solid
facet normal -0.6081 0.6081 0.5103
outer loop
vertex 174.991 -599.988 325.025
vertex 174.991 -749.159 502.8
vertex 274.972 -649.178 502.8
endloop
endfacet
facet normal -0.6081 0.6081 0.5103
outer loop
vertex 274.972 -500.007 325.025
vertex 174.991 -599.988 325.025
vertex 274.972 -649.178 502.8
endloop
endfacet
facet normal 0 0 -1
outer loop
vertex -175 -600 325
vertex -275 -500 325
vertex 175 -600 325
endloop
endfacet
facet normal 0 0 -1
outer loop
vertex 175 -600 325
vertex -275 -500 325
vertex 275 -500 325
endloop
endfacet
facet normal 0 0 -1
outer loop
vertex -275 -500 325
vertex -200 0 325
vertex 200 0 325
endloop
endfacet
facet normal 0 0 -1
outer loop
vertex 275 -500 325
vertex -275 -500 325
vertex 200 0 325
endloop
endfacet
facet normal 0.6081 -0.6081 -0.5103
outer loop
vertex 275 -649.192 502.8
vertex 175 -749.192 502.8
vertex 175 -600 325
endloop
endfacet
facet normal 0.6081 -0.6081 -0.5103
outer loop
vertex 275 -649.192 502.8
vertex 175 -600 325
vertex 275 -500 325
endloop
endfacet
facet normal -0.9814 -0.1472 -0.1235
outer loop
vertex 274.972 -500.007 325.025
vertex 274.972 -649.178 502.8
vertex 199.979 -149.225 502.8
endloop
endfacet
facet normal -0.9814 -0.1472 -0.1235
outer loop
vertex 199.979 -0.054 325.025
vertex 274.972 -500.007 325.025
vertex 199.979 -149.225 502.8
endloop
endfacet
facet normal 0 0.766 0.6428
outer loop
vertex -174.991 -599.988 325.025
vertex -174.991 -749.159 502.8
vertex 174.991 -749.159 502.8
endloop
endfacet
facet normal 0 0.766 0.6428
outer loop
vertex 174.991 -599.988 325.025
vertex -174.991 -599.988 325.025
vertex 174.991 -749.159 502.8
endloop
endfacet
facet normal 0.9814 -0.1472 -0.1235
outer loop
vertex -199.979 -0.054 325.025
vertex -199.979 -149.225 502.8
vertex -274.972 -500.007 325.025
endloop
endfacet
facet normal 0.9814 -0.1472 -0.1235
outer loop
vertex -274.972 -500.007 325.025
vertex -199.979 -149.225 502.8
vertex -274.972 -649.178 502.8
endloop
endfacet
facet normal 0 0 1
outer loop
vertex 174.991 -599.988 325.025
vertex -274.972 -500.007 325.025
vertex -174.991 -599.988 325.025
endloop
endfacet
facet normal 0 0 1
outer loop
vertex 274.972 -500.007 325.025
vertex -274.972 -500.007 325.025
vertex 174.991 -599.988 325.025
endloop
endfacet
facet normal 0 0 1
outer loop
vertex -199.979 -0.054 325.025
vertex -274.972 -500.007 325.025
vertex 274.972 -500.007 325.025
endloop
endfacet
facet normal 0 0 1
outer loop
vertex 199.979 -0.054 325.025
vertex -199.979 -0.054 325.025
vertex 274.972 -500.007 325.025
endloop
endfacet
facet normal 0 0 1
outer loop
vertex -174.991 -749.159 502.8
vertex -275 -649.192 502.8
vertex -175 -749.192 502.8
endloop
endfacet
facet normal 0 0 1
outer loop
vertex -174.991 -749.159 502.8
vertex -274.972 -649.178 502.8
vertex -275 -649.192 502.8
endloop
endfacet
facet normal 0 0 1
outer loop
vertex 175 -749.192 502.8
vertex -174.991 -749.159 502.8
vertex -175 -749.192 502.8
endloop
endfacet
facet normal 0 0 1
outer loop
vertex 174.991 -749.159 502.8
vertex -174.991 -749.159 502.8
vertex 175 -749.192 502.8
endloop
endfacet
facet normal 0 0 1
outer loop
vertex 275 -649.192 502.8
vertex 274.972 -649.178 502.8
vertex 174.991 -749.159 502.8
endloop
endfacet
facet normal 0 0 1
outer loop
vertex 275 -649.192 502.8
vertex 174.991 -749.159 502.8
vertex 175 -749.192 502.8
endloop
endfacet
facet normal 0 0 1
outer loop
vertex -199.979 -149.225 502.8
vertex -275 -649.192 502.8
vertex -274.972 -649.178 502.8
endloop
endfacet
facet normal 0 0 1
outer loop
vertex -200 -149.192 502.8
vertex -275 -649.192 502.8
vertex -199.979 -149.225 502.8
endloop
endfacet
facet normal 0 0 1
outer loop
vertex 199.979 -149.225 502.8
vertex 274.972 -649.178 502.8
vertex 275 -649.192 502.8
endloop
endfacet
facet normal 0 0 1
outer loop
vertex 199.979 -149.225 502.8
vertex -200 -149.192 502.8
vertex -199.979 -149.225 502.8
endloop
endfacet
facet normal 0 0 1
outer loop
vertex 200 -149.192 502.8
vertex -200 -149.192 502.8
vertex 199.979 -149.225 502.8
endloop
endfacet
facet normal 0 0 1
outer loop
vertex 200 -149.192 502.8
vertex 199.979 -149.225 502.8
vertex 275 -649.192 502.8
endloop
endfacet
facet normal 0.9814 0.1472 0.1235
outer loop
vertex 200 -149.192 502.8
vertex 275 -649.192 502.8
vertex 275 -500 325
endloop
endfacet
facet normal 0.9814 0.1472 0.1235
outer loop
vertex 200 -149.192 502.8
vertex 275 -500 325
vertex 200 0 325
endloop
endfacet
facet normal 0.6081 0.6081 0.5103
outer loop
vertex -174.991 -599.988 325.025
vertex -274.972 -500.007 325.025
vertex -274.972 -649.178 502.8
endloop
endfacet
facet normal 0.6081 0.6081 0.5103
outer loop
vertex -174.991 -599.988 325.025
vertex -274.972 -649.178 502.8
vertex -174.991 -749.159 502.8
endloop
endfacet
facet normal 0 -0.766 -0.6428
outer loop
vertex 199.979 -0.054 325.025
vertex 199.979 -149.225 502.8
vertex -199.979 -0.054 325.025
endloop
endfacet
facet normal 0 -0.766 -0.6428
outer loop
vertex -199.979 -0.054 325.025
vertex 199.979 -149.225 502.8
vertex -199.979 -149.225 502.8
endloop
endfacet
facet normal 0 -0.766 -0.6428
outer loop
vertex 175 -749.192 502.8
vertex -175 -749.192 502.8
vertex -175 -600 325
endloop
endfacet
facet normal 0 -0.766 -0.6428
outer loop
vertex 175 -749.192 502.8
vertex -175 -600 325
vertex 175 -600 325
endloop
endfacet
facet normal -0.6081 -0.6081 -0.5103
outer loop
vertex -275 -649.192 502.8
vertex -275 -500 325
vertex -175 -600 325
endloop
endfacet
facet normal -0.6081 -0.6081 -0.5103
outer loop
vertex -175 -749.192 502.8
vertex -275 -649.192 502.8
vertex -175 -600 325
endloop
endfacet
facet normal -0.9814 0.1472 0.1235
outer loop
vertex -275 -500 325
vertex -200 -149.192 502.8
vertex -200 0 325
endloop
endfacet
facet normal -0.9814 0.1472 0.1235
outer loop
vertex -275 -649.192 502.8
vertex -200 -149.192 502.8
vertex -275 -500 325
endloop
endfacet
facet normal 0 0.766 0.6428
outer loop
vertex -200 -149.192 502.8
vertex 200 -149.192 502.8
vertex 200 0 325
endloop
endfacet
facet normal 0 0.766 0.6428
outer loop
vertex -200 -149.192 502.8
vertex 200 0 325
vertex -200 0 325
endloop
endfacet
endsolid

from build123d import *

# Parameters (mm, degrees)
SHELL2_T = -0.0254


with BuildPart() as part:
    # Sweep2: sweep along a path in Sketch2
    with BuildLine(Plane(origin=(0, 0, 0), x_dir=(0, 0, -1), z_dir=(1, 0, 0))) as sweep2_path:
        Line((-325, 0), (-502.8, -149.191914423))
    # Sketch3 → Sweep2 (sweep)
    with BuildSketch(Plane.XY.offset(325)):
        Polygon((200, 0), (-200, 0), (-275, -500), (-175, -600), (175, -600), (275, -500), align=None)
    sweep(path=sweep2_path.line)

    # Shell2
    shell2_openings = [part.faces().sort_by_distance(p)[0] for p in [
        (0, -457.451501444, 502.8),
    ]]
    offset(amount=SHELL2_T, openings=shell2_openings, kind=Kind.INTERSECTION)


solid = part.part
